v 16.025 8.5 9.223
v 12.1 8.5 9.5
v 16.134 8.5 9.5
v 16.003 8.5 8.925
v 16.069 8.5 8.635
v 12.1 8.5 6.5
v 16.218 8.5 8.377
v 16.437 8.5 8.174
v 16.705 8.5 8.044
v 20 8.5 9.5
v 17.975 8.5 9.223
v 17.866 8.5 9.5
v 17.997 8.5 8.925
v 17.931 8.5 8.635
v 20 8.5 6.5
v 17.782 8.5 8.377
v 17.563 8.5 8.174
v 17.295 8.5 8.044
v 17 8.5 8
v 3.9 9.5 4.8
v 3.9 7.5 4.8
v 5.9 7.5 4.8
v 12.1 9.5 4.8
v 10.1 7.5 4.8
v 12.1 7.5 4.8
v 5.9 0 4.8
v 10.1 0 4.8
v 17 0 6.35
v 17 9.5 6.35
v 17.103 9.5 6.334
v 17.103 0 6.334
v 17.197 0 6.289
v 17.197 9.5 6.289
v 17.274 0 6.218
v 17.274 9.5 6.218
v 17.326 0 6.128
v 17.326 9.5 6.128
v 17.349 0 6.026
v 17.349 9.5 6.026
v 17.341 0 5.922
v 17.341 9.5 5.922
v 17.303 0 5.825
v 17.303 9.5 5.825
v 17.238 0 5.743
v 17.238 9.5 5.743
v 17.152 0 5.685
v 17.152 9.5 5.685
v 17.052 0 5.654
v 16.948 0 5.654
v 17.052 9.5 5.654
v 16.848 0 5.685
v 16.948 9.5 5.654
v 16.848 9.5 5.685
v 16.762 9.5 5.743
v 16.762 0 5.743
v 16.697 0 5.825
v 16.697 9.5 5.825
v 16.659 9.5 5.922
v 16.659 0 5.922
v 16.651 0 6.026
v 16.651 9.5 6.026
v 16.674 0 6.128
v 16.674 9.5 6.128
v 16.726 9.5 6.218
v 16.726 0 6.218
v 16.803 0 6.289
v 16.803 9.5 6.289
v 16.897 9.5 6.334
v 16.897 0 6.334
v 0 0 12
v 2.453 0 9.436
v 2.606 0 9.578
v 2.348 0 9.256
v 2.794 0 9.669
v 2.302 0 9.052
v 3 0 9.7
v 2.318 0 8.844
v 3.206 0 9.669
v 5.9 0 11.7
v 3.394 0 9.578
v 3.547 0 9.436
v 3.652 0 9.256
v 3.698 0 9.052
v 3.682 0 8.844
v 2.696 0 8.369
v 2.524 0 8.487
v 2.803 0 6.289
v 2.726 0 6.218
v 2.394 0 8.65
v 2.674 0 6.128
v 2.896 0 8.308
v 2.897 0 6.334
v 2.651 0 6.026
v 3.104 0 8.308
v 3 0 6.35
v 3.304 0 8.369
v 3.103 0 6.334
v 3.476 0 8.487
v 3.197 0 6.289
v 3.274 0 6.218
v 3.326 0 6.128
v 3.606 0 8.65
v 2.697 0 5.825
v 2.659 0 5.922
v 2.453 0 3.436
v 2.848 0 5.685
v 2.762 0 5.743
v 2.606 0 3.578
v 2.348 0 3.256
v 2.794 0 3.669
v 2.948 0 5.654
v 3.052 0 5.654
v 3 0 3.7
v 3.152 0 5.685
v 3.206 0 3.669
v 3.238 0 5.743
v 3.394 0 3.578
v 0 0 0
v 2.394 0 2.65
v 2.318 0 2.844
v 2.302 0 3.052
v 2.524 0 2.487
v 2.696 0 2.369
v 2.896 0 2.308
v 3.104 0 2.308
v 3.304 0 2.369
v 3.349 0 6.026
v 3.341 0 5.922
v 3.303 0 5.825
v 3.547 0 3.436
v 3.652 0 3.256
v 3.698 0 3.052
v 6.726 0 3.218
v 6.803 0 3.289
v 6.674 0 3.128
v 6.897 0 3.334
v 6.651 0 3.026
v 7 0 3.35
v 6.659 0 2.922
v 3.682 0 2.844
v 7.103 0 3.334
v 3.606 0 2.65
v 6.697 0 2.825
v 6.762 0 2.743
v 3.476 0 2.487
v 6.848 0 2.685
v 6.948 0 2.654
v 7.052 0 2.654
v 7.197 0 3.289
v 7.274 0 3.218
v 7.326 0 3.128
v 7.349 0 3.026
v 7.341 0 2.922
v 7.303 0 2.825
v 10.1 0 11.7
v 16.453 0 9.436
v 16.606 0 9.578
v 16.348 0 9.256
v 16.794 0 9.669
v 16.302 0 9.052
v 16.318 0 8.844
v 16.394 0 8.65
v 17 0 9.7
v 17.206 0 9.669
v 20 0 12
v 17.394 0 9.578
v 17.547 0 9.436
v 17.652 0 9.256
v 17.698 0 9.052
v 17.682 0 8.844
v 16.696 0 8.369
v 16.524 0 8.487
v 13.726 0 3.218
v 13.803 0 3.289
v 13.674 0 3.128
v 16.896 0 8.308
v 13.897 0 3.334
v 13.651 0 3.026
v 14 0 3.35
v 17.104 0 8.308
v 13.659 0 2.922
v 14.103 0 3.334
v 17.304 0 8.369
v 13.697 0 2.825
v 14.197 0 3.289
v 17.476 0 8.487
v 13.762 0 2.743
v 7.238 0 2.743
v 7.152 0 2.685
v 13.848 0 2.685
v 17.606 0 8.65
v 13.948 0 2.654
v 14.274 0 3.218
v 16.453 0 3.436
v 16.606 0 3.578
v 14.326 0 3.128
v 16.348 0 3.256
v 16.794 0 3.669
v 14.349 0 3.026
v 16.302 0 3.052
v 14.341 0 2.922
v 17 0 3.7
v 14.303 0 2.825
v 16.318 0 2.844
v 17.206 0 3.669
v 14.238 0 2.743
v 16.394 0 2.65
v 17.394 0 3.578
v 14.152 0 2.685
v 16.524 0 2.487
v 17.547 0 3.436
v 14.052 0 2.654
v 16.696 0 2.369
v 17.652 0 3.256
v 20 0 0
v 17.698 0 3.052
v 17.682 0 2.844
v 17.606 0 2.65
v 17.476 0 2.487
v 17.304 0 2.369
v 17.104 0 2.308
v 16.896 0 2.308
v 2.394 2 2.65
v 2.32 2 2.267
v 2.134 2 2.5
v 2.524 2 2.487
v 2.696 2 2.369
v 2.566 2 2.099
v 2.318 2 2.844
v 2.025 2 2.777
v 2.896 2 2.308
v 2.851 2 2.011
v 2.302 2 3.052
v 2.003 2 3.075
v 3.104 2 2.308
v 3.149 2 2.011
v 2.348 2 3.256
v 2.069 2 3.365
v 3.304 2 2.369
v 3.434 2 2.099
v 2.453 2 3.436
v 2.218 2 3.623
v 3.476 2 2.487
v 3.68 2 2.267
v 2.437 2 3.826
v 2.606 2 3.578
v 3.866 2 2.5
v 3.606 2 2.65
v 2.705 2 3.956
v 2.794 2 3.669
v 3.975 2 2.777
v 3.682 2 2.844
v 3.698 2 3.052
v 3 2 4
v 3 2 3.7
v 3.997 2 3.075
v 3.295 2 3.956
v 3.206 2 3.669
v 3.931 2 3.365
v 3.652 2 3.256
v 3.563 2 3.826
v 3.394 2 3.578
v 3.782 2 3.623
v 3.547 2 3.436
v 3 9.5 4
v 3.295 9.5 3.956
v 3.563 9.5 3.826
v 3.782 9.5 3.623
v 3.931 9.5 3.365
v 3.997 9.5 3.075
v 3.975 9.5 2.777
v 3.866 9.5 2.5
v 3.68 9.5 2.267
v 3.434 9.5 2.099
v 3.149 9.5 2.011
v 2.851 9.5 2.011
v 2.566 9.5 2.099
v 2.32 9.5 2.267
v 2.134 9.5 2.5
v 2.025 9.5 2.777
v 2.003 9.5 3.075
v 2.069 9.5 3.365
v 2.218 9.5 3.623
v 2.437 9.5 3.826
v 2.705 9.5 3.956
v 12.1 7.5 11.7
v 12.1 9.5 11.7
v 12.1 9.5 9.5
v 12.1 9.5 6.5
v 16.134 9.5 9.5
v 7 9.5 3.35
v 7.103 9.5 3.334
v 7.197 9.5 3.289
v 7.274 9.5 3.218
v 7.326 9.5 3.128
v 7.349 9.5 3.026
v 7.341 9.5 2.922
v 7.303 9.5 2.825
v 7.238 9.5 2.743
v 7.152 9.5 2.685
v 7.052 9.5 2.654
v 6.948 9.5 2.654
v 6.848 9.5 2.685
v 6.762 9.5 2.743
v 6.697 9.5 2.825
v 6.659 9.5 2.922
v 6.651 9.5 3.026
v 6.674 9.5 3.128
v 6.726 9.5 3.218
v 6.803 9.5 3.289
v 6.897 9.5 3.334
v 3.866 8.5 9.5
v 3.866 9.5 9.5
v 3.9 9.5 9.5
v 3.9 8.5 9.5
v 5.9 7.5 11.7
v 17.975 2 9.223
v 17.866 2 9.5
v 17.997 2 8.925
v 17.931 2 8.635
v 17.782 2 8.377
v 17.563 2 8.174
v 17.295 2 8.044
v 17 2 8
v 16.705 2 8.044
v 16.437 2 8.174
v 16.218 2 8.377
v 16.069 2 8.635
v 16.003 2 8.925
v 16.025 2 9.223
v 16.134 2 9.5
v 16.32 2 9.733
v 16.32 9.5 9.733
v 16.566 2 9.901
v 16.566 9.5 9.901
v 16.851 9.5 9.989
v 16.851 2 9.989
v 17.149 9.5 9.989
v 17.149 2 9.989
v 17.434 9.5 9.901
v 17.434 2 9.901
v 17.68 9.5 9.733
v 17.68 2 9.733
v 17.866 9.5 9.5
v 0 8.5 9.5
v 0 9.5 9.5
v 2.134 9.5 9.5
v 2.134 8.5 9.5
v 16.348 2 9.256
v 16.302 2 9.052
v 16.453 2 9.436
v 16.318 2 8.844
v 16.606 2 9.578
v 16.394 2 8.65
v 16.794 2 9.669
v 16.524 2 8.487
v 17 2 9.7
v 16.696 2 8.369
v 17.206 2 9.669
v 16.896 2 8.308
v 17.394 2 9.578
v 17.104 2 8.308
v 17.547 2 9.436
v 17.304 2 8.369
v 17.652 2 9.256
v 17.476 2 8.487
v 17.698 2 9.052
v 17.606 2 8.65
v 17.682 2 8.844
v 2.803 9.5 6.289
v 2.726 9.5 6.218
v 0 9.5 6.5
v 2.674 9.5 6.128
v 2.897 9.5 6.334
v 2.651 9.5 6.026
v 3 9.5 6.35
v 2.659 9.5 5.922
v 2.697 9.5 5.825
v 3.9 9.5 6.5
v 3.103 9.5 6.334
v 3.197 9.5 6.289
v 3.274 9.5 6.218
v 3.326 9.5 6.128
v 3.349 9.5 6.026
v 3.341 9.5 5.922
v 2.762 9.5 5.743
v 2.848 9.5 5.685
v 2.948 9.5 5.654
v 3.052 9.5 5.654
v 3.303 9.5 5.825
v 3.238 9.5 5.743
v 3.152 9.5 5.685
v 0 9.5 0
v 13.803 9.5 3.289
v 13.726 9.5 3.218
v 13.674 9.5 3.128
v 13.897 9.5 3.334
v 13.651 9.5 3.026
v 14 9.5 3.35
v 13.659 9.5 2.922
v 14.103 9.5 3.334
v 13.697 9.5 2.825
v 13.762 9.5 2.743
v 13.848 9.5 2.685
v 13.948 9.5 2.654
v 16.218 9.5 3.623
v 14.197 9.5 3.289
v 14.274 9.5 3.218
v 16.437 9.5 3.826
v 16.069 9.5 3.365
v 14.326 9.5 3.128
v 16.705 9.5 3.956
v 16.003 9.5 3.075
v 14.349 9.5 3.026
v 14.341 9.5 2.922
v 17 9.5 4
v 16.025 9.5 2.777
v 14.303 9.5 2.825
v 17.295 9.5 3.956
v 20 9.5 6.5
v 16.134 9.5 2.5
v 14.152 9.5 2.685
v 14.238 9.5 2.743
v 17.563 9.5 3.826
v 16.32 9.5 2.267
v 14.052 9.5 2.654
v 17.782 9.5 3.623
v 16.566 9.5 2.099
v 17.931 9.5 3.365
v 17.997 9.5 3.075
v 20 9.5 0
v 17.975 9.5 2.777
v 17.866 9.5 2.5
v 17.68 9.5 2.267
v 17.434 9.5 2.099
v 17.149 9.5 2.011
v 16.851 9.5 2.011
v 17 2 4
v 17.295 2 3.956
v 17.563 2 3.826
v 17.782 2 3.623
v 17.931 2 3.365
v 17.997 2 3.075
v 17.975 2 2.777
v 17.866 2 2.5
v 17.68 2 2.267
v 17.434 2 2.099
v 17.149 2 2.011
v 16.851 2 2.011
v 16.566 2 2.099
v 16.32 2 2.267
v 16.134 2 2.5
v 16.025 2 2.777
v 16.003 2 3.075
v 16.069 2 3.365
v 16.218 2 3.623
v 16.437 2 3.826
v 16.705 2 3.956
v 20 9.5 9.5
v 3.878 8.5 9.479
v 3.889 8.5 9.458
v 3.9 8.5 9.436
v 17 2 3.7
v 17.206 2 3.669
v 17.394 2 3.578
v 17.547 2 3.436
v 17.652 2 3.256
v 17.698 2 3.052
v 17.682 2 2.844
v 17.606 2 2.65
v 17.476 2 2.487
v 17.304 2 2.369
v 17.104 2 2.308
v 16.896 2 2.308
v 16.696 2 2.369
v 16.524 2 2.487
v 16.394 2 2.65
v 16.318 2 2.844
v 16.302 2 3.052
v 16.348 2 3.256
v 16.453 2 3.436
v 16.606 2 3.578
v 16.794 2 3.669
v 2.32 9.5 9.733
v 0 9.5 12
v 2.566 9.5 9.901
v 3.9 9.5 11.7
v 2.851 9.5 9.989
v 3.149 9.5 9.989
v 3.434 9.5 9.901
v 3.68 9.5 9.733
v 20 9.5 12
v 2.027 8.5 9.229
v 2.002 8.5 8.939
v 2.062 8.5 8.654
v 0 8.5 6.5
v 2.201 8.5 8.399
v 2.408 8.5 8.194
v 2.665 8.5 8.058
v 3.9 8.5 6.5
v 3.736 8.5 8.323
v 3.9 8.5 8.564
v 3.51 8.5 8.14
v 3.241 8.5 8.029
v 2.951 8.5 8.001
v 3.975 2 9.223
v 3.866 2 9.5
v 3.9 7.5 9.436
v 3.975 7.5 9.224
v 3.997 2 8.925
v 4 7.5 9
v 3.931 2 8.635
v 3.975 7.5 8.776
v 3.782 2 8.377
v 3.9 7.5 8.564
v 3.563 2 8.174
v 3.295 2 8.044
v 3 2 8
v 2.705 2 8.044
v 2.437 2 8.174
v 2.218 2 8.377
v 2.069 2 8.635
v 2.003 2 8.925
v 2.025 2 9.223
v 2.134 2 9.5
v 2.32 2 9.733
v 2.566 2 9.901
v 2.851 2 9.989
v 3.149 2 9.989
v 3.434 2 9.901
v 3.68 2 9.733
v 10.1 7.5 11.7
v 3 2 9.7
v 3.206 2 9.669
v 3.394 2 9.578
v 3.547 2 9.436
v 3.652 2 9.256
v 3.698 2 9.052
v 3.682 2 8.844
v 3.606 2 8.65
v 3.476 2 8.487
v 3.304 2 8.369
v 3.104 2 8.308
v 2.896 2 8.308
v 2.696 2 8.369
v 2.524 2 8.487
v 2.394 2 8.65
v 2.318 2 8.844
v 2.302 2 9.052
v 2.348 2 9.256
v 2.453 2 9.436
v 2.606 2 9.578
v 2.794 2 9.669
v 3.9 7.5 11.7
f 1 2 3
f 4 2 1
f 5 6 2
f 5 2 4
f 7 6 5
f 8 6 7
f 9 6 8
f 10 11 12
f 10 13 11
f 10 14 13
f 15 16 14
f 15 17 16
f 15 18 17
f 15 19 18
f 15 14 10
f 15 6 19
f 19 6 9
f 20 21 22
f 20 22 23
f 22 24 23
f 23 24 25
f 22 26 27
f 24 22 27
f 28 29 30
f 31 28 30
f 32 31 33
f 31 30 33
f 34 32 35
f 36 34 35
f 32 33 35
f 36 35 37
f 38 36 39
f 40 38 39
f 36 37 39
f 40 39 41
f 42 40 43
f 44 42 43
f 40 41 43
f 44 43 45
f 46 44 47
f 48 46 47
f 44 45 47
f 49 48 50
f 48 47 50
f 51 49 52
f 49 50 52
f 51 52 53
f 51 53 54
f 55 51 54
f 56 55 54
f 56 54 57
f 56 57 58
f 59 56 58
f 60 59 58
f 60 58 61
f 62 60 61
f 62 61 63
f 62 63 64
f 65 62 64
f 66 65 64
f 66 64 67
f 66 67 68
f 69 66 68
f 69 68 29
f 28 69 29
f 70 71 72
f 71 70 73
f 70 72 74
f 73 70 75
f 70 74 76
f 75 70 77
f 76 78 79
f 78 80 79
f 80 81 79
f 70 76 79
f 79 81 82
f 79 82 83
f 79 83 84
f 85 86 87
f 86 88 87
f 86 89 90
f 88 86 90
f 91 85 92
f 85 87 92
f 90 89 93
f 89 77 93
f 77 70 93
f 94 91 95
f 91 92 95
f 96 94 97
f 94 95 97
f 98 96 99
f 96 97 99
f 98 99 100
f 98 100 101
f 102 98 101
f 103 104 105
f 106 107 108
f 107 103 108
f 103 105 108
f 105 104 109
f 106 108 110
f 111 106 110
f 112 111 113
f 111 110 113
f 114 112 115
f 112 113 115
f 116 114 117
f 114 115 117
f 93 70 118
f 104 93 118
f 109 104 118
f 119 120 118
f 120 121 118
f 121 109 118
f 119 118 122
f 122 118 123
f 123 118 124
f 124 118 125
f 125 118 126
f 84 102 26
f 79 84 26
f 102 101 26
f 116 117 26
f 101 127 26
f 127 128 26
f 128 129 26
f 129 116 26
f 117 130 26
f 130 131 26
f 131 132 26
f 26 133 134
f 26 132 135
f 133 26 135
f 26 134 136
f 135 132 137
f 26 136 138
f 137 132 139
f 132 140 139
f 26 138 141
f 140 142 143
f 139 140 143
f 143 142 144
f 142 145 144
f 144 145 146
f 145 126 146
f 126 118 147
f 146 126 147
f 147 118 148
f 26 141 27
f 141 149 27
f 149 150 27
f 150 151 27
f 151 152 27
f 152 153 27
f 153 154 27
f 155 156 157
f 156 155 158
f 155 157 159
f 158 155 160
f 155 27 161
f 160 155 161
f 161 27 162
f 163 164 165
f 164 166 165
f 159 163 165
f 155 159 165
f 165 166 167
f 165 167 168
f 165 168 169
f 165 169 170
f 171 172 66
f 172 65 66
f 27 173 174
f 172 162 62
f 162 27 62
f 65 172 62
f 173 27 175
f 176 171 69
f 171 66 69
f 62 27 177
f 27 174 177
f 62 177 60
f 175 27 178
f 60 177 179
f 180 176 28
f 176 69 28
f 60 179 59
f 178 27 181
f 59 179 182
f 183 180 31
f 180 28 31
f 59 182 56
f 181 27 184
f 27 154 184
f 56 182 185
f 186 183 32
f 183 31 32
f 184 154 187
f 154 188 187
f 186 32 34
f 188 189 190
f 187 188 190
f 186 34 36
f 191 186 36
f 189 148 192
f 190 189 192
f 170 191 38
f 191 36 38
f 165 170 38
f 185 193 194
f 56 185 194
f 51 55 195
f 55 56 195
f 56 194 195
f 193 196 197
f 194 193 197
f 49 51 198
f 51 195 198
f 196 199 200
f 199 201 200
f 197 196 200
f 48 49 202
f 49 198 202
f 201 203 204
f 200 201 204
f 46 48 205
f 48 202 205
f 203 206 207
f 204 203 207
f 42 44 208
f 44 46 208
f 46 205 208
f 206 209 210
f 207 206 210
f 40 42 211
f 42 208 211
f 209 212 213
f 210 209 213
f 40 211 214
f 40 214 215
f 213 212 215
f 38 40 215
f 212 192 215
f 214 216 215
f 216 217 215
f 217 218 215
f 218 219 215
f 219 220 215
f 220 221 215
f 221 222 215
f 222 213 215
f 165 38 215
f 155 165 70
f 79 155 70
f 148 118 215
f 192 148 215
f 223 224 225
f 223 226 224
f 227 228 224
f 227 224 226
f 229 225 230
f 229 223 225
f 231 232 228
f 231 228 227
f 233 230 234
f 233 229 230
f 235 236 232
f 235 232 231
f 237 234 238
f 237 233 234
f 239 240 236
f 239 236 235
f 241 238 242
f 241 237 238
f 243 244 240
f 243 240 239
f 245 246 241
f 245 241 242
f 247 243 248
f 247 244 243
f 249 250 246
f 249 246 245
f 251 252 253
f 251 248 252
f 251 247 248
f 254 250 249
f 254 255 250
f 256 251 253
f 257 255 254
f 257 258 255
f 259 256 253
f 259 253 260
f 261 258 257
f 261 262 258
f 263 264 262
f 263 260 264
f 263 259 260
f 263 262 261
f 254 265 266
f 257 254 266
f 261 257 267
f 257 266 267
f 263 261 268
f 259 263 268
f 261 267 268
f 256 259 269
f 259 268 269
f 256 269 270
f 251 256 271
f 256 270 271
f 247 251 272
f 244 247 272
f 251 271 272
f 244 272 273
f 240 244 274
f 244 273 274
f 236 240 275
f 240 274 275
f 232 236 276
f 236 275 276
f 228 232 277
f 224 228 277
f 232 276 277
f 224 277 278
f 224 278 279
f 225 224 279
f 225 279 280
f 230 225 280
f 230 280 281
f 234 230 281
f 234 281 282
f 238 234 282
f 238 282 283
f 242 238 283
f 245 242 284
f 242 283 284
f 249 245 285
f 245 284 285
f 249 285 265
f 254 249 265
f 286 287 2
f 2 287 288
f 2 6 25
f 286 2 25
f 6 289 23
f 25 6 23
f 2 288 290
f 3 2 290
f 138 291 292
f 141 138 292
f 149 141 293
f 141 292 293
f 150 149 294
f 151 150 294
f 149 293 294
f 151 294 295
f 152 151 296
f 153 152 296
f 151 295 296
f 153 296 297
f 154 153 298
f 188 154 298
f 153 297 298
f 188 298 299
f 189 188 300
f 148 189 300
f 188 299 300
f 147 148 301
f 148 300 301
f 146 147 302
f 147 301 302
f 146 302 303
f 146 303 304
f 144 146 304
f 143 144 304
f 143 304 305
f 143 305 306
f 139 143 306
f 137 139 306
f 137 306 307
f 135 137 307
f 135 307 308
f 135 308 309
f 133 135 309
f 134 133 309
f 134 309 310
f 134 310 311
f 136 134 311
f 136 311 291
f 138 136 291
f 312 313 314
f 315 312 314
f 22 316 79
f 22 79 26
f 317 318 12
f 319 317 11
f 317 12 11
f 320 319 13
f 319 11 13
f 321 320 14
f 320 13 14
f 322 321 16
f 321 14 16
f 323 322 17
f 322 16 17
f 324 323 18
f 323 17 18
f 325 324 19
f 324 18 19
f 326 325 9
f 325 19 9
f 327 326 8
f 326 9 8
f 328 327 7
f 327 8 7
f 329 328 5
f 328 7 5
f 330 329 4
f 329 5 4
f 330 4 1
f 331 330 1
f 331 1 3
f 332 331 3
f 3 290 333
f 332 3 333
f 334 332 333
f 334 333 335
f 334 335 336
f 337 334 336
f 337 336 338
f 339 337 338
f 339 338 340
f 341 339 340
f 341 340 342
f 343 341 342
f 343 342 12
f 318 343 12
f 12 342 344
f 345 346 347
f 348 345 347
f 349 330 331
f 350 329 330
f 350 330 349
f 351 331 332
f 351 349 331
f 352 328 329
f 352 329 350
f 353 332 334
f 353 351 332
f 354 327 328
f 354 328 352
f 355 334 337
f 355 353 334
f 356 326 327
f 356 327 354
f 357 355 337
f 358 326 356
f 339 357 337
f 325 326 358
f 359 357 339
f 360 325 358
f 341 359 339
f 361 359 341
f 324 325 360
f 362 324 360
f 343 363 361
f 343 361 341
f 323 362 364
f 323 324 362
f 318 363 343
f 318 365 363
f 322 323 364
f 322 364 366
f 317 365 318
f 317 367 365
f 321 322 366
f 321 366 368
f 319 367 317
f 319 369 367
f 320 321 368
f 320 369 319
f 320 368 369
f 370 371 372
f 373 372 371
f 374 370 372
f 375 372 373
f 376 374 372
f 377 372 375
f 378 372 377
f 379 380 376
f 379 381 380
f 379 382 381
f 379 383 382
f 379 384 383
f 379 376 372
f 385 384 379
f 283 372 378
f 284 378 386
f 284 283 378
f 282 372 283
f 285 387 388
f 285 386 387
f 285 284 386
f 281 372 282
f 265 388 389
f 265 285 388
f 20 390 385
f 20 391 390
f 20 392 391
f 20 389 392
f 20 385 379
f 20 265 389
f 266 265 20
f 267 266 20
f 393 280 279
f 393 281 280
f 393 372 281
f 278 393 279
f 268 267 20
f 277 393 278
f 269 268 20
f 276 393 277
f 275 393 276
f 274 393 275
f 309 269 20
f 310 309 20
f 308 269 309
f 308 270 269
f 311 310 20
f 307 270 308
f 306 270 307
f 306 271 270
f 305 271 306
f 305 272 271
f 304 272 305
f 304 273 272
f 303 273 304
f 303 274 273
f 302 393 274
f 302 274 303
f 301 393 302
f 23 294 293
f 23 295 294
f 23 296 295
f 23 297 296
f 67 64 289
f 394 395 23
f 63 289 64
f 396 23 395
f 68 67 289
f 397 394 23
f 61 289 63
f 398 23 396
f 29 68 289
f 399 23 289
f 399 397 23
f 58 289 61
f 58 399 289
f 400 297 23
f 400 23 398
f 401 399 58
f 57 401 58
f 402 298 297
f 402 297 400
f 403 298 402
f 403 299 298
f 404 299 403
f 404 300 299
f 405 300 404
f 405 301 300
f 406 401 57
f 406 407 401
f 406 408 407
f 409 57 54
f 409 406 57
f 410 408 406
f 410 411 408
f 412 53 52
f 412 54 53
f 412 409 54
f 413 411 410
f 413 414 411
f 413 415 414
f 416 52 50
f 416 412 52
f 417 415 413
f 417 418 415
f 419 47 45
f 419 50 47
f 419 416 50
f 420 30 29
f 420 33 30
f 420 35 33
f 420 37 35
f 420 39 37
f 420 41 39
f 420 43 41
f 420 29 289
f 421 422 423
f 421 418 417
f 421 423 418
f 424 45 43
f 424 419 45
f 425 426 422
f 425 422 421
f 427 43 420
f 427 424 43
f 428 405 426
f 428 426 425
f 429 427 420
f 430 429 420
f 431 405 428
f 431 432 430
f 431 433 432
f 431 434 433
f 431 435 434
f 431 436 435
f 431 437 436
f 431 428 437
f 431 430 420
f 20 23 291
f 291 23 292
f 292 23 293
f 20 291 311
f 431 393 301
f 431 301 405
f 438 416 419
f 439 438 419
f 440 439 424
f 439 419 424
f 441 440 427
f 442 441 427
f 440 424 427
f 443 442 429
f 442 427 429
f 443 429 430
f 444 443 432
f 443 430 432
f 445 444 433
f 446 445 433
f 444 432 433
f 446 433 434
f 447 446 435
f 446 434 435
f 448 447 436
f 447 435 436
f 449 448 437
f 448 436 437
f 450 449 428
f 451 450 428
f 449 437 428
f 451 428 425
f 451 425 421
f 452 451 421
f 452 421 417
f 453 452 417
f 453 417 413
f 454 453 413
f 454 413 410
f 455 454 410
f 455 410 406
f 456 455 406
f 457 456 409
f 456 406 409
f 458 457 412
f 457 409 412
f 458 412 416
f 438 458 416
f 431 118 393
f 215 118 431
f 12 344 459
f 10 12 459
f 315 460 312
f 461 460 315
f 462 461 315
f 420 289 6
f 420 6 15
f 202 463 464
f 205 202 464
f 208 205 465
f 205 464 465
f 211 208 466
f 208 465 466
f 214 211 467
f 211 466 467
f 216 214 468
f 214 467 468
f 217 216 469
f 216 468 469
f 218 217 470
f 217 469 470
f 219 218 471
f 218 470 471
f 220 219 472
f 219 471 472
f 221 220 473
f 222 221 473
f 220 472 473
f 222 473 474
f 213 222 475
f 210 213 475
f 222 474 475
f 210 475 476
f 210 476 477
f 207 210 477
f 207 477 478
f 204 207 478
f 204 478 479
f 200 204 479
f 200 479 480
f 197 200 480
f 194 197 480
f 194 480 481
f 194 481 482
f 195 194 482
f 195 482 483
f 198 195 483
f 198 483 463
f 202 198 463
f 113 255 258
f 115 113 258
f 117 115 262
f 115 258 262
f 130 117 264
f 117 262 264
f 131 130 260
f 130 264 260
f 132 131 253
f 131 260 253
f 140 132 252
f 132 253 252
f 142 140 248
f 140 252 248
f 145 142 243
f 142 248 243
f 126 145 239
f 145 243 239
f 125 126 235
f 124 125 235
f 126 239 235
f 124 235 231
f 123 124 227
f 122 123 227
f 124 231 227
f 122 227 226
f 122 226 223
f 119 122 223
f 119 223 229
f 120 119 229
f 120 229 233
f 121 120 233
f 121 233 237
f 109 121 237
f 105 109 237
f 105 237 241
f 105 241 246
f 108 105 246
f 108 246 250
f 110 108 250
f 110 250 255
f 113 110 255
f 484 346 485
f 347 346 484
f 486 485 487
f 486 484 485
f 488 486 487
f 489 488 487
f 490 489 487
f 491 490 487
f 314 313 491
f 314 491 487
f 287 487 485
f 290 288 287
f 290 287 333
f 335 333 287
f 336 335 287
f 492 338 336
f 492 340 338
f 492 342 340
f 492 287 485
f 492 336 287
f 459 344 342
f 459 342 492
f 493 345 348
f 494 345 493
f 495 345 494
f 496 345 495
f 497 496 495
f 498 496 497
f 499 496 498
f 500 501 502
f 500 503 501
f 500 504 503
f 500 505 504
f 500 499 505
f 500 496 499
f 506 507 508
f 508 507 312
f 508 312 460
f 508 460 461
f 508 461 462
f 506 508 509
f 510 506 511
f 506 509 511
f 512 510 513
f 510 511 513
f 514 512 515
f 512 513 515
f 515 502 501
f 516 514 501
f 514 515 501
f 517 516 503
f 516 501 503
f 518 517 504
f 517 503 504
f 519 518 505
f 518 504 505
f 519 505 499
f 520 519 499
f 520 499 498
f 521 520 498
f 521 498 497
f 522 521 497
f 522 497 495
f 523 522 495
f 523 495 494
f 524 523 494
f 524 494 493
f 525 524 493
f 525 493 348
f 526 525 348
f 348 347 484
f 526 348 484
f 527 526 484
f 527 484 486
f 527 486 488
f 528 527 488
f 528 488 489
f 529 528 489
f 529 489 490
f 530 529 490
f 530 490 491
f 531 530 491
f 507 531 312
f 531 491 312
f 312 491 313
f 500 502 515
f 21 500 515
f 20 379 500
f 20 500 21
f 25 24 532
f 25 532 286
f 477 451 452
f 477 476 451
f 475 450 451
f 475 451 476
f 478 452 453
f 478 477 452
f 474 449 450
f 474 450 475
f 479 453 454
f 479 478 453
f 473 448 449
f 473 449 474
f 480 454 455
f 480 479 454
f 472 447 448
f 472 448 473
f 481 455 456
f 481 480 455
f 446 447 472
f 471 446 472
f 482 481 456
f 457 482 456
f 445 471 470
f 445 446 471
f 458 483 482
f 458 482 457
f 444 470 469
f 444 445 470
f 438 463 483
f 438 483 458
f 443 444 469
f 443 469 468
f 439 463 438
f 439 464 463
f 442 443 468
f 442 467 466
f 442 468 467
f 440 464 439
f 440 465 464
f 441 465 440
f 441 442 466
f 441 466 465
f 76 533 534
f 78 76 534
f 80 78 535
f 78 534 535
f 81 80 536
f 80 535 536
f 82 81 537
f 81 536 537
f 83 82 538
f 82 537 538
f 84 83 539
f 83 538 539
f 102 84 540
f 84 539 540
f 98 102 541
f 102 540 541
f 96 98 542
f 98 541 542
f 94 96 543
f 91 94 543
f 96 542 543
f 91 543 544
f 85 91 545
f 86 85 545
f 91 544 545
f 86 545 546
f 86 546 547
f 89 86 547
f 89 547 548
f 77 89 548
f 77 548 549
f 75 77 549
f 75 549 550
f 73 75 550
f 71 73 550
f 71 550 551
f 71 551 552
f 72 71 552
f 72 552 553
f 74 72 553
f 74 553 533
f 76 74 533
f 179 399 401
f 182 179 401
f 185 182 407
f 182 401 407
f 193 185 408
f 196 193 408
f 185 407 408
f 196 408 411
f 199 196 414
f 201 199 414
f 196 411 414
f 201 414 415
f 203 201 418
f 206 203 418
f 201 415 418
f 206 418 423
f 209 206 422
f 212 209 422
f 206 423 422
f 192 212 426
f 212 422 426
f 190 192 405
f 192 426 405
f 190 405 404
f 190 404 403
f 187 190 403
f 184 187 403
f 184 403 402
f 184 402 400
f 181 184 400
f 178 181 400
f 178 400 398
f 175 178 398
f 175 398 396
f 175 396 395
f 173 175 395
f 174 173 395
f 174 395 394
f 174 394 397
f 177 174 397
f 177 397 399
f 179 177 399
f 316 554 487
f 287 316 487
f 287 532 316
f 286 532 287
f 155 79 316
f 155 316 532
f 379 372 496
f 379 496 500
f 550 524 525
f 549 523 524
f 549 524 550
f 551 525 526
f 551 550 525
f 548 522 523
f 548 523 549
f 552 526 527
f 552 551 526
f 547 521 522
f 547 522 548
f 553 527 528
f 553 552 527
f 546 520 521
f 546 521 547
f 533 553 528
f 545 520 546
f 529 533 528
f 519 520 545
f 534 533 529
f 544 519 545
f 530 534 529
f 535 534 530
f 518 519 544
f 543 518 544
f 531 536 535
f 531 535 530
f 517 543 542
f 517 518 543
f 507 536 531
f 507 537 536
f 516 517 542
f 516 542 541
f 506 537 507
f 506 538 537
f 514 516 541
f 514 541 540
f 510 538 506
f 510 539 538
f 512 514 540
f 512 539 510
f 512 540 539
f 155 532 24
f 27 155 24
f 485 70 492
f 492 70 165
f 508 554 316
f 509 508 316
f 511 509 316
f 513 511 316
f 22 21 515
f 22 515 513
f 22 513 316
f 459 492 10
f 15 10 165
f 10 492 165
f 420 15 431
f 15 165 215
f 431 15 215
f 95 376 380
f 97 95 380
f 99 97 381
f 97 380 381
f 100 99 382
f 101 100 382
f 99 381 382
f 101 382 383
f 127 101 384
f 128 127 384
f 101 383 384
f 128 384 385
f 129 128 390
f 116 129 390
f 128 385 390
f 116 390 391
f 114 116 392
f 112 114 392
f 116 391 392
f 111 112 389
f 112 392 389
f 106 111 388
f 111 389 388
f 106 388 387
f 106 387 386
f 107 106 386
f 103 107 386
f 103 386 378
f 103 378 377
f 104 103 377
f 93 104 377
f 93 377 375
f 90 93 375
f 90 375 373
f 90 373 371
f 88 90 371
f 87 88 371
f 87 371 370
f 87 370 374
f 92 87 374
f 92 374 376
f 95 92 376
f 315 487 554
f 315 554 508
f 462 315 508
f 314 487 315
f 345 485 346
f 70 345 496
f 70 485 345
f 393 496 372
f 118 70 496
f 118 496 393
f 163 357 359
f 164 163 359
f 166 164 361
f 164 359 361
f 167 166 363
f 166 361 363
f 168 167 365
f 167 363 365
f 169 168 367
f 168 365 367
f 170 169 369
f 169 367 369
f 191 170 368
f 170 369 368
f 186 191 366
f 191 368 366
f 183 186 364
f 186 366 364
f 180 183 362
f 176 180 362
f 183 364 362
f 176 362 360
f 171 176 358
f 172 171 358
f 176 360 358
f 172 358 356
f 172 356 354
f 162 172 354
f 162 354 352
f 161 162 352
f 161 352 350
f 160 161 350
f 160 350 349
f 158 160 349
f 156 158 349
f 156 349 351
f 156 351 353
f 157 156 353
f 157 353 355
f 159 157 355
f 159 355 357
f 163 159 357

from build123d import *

# Parameters (mm, degrees)
SKETCH_1_W          = 20
SKETCH_1_H          = 12
SKETCH_1_W_2        = 4.2
SKETCH_1_H_2        = 6.9
EXTRUDE_1_DEPTH     = 9.5
CUT_EXTRUDE_START   = 9.5
SKETCH_1_4_W        = 20
SKETCH_1_4_H        = 3
CUT_EXTRUDE_2_DEPTH = 1
SKETCH_1_6_W        = 8.2
SKETCH_1_6_H        = 6.9
CUT_EXTRUDE_4_DEPTH = 2
SKETCH_2_R          = 0.7
SKETCH_2_R_2        = 0.35
CUT_EXTRUDE_5_DEPTH = 26.184320519
SKETCH_2_3_R        = 1
CUT_EXTRUDE_6_DEPTH = 7.5


with BuildPart() as part:
    # 草图1 → 凸台-拉伸1 (new body)
    with BuildSketch(Plane(origin=(0, 0, 0), x_dir=(1, 0, 0), z_dir=(0, 1, 0))):
        with Locations((10, -6)):
            Rectangle(SKETCH_1_W, SKETCH_1_H)
        with Locations((8, -8.25)):
            Rectangle(SKETCH_1_W_2, SKETCH_1_H_2, mode=Mode.SUBTRACT)
    extrude(amount=EXTRUDE_1_DEPTH)

    # 草图1<4> → 切除-拉伸2 (cut)
    with BuildSketch(Plane(origin=(0, 0, 0), x_dir=(1, 0, 0), z_dir=(0, 1, 0)).offset(CUT_EXTRUDE_START)):
        with Locations((10, -8)):
            Rectangle(SKETCH_1_4_W, SKETCH_1_4_H)
    extrude(amount=-CUT_EXTRUDE_2_DEPTH, mode=Mode.SUBTRACT)

    # 草图1<6> → 切除-拉伸4 (cut)
    with BuildSketch(Plane(origin=(0, 0, 0), x_dir=(1, 0, 0), z_dir=(0, 1, 0)).offset(CUT_EXTRUDE_START)):
        with Locations((8, -8.25)):
            Rectangle(SKETCH_1_6_W, SKETCH_1_6_H)
    extrude(amount=-CUT_EXTRUDE_4_DEPTH, mode=Mode.SUBTRACT)

    # 草图2 → 切除-拉伸5 (cut, through all)
    with BuildSketch(Plane(origin=(0, 9.5, 0), x_dir=(1, 0, 0), z_dir=(0, 1, 0))):
        with Locations(Location((3, -3, 0), (0, 0, 270))):
            Circle(SKETCH_2_R)
        with Locations(Location((3, -9, 0), (0, 0, 270))):
            Circle(SKETCH_2_R)
        with Locations(Location((17, -3, 0), (0, 0, 270))):
            Circle(SKETCH_2_R)
        with Locations(Location((17, -9, 0), (0, 0, 270))):
            Circle(SKETCH_2_R)
        with Locations(Location((7, -3, 0), (0, 0, 270))):
            Circle(SKETCH_2_R_2)
        with Locations(Location((14, -3, 0), (0, 0, 270))):
            Circle(SKETCH_2_R_2)
        with Locations(Location((3, -6, 0), (0, 0, 270))):
            Circle(SKETCH_2_R_2)
        with Locations(Location((17, -6, 0), (0, 0, 270))):
            Circle(SKETCH_2_R_2)
    extrude(amount=-CUT_EXTRUDE_5_DEPTH, mode=Mode.SUBTRACT)

    # 草图2<3> → 切除-拉伸6 (cut)
    with BuildSketch(Plane(origin=(0, 9.5, 0), x_dir=(1, 0, 0), z_dir=(0, 1, 0))):
        with Locations(Location((3, -3, 0), (0, 0, 270))):
            Circle(SKETCH_2_3_R)
        with Locations(Location((3, -9, 0), (0, 0, 330))):
            Circle(SKETCH_2_3_R)
        with Locations(Location((17, -3, 0), (0, 0, 270))):
            Circle(SKETCH_2_3_R)
        with Locations(Location((17, -9, 0), (0, 0, 330))):
            Circle(SKETCH_2_3_R)
    extrude(amount=-CUT_EXTRUDE_6_DEPTH, mode=Mode.SUBTRACT)


solid = part.part
